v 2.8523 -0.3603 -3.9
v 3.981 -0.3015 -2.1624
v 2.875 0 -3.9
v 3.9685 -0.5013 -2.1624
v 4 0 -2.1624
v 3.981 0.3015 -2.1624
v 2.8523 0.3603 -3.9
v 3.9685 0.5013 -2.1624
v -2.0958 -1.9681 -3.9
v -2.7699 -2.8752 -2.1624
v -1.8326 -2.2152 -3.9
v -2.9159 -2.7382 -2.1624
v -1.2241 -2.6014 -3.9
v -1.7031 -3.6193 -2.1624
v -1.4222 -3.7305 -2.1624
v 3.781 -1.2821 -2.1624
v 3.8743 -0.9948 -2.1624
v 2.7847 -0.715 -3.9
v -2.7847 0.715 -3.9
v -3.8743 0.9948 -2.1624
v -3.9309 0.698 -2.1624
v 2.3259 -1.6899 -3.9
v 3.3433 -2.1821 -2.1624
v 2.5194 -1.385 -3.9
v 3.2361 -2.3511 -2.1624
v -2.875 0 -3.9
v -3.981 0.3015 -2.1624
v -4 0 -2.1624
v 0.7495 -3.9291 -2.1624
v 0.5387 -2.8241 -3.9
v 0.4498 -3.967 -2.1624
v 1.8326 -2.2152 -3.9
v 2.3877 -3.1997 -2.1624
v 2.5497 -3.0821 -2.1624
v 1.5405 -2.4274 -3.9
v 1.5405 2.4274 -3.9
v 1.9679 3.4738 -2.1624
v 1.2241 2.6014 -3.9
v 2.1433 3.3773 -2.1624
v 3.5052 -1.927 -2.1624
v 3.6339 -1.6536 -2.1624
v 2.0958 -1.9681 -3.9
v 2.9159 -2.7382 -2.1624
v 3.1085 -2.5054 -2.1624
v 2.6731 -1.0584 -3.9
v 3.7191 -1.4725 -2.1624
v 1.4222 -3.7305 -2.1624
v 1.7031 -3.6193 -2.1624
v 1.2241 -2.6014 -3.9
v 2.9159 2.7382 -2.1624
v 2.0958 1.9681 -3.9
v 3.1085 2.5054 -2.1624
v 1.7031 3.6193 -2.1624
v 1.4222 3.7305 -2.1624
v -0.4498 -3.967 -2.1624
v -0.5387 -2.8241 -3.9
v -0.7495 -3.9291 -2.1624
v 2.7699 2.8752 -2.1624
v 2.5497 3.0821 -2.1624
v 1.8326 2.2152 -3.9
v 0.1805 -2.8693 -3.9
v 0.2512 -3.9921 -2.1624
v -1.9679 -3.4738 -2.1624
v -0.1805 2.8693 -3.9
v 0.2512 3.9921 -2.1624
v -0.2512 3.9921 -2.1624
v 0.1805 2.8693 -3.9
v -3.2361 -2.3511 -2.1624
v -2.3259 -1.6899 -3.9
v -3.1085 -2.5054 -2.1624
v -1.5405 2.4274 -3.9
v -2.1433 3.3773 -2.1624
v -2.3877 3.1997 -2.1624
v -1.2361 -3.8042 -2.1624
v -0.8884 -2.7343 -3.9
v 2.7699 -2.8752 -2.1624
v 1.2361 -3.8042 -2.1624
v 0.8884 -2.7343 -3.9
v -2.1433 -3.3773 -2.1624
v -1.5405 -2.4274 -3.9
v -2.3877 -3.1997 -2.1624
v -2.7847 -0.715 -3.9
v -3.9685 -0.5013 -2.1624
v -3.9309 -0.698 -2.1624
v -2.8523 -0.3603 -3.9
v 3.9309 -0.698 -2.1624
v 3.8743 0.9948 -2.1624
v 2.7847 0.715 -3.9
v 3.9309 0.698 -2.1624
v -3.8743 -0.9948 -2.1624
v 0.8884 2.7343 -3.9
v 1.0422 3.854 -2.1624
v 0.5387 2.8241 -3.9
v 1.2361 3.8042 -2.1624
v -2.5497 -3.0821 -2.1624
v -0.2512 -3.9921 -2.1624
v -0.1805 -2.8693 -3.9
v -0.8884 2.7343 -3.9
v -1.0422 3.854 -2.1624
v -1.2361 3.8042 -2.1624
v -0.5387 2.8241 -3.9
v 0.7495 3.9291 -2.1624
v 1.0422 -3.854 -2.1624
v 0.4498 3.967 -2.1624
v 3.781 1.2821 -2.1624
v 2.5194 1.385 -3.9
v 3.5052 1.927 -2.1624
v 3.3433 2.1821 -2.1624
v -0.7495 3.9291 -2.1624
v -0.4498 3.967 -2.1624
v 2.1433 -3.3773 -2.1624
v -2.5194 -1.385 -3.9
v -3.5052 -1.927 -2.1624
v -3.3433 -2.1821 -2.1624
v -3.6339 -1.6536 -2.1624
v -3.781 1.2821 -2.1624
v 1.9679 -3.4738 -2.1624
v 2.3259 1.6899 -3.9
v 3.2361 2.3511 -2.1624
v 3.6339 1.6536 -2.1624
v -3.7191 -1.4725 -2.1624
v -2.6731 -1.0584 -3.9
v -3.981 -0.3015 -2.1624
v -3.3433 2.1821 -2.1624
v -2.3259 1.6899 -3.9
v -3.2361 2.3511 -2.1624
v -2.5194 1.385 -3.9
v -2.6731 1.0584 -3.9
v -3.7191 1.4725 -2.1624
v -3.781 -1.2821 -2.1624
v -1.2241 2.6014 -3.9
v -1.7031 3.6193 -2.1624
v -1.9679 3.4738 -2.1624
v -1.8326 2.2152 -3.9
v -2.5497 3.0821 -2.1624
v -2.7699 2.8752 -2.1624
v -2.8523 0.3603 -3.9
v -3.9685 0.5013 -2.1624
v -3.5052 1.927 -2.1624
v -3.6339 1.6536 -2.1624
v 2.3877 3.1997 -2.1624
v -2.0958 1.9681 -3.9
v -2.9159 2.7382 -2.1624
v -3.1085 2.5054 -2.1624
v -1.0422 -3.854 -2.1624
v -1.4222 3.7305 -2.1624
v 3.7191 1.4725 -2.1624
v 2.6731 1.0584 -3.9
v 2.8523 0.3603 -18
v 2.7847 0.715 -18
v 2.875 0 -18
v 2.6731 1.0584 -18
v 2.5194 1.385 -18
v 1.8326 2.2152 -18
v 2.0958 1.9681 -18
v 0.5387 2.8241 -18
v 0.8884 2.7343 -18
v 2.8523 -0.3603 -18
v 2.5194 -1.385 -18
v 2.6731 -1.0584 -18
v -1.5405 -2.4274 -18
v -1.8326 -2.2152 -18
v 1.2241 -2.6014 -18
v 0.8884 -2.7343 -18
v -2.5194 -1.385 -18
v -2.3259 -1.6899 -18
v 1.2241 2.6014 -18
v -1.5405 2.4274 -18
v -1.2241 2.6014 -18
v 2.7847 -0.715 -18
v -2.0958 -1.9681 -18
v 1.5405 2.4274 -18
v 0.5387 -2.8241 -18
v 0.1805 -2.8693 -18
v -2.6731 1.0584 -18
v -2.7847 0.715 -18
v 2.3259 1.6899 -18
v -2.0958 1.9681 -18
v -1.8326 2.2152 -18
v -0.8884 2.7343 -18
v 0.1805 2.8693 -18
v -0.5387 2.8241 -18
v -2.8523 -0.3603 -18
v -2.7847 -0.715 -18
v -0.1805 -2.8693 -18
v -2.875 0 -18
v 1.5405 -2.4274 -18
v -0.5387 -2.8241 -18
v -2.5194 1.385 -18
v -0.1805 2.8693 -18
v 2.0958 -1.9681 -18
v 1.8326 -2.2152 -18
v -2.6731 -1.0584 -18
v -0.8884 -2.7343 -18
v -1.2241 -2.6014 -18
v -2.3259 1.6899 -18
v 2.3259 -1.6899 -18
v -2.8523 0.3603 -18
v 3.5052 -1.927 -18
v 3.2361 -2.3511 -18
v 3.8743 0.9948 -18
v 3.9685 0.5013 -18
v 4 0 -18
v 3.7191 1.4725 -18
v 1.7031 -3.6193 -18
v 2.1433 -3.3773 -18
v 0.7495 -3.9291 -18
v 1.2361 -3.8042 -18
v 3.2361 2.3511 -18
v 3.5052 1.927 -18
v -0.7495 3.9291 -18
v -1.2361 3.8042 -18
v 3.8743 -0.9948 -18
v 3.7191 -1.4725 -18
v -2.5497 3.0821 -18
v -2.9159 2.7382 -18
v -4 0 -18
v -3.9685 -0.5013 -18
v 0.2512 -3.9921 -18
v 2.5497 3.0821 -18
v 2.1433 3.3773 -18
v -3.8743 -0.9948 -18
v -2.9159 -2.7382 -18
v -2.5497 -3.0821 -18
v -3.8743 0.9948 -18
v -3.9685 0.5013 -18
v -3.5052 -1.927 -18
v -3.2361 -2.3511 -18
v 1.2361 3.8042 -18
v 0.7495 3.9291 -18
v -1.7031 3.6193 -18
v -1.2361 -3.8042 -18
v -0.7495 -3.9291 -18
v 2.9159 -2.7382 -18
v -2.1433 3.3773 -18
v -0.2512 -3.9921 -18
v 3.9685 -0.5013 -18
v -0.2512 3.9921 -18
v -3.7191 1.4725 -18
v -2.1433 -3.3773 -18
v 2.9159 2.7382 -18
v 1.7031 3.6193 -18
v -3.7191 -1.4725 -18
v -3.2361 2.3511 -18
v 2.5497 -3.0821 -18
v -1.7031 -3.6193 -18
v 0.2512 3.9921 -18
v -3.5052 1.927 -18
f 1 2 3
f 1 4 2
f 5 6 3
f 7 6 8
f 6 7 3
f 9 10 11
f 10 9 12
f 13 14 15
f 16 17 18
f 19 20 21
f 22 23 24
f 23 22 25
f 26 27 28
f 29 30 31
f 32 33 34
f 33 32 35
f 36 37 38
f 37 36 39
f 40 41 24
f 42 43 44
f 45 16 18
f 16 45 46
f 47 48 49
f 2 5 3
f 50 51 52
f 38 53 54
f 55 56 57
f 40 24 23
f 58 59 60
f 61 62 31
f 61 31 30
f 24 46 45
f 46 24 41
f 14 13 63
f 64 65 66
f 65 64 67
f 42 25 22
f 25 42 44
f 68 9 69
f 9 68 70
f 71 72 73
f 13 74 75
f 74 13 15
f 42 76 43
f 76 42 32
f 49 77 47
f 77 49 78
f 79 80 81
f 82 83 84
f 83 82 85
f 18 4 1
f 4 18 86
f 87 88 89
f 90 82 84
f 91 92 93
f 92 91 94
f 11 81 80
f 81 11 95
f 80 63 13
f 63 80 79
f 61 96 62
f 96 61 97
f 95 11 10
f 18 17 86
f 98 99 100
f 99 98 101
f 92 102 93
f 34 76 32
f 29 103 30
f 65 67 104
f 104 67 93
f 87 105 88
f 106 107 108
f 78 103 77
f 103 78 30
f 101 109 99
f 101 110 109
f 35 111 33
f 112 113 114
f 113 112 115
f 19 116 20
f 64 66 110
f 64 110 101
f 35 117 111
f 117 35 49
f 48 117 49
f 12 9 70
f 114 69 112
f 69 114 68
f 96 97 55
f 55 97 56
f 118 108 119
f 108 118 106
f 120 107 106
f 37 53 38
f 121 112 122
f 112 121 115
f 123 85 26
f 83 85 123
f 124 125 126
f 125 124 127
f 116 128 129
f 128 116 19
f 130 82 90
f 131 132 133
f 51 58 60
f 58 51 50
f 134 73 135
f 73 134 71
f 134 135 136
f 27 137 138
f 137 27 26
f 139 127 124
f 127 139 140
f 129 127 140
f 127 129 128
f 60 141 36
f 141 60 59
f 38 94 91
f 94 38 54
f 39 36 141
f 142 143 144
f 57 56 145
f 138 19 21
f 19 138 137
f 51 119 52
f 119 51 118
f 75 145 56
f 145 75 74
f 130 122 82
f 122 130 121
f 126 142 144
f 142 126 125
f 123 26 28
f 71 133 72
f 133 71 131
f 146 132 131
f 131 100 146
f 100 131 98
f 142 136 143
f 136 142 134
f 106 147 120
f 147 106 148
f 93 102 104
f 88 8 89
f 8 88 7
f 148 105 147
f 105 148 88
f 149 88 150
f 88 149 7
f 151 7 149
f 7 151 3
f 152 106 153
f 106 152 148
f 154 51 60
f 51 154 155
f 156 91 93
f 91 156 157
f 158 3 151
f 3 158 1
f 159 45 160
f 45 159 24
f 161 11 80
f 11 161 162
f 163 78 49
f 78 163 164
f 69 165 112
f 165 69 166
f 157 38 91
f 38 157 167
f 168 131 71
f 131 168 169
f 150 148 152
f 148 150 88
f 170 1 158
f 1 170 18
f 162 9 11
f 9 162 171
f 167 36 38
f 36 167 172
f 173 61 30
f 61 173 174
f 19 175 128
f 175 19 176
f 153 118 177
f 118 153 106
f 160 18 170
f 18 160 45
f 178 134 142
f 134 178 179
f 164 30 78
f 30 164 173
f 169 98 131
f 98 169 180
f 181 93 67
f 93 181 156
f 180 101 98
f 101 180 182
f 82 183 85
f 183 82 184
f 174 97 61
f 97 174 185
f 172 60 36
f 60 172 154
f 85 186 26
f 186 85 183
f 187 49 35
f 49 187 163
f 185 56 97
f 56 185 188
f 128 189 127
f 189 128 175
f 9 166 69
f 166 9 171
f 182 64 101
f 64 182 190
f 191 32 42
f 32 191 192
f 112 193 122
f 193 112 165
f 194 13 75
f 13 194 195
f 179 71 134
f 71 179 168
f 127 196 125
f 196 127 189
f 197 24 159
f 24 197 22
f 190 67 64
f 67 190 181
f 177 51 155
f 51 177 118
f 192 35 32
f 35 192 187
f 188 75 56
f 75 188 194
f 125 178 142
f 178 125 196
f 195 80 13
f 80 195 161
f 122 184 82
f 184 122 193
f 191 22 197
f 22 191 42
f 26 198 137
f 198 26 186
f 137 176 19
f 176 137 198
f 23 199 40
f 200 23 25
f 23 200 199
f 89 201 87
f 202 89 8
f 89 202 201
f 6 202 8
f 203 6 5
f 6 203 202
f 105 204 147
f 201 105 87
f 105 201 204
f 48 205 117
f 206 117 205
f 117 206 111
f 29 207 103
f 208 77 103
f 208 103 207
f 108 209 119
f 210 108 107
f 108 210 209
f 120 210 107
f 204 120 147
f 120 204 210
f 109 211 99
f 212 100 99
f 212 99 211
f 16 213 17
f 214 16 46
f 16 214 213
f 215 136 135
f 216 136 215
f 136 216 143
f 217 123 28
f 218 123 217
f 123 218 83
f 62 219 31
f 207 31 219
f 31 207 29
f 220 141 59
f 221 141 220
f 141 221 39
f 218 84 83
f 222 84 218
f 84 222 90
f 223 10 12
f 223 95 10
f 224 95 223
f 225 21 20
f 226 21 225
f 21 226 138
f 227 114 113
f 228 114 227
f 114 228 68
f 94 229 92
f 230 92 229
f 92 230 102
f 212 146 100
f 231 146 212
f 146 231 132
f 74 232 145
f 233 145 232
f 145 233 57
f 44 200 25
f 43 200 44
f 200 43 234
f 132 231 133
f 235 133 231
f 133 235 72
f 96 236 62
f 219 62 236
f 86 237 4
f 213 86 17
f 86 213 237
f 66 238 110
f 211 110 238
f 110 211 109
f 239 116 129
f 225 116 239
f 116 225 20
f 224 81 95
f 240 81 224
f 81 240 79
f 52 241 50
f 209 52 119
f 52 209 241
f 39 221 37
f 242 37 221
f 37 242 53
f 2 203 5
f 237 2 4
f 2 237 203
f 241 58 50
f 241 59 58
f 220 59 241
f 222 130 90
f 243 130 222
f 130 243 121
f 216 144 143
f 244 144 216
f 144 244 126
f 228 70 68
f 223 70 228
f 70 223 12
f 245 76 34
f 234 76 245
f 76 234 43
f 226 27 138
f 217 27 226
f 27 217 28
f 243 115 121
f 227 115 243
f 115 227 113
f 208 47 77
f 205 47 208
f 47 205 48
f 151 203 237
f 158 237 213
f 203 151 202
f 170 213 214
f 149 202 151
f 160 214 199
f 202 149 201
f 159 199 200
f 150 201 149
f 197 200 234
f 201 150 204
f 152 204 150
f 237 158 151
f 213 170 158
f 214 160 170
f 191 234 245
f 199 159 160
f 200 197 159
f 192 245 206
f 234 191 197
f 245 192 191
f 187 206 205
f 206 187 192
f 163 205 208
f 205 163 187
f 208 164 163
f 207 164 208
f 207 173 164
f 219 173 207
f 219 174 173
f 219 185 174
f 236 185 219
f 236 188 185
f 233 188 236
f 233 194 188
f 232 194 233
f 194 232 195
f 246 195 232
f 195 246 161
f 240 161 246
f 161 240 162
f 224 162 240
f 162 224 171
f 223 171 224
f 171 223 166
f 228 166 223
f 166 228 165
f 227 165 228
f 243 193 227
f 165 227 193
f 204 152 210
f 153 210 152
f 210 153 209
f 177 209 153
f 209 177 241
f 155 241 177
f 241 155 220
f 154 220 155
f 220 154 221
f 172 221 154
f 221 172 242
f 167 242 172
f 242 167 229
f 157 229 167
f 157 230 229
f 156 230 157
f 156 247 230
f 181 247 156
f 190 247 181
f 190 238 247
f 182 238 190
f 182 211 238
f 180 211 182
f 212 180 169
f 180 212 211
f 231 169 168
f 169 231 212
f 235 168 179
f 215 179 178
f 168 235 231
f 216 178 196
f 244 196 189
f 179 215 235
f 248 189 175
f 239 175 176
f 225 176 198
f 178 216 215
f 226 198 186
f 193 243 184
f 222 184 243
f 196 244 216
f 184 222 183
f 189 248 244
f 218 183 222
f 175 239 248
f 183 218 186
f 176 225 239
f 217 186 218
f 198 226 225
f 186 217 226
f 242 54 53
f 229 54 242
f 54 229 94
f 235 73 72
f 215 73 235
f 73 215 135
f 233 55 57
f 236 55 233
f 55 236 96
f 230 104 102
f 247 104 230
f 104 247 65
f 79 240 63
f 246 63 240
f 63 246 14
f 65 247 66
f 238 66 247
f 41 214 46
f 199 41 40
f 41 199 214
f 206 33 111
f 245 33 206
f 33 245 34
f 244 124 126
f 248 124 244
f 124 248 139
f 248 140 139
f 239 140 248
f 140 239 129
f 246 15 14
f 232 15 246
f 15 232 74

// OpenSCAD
$fn = 50;

difference() {
	union() {
		translate(v = [0, 0, -18.0]) {
			cylinder(h = 18, r = 4.0);
		}
	}
	union() {
		translate(v = [0, 0, 0]) {
			rotate(a = [0, 0, 0]) {
				difference() {
					union() {
						translate(v = [0, 0, -21.0]) {
							cylinder(h = 21, r = 2.6);
						}
						translate(v = [0, 0, -3.9]) {
							cylinder(h = 3.9, r1 = 2.875, r2 = 5.4);
						}
						translate(v = [0, 0, -21.0]) {
							cylinder(h = 21, r = 2.875);
						}
						translate(v = [0, 0, -21.0]) {
							cylinder(h = 21, r = 2.6);
						}
					}
					union();
				}
			}
		}
	}
}
